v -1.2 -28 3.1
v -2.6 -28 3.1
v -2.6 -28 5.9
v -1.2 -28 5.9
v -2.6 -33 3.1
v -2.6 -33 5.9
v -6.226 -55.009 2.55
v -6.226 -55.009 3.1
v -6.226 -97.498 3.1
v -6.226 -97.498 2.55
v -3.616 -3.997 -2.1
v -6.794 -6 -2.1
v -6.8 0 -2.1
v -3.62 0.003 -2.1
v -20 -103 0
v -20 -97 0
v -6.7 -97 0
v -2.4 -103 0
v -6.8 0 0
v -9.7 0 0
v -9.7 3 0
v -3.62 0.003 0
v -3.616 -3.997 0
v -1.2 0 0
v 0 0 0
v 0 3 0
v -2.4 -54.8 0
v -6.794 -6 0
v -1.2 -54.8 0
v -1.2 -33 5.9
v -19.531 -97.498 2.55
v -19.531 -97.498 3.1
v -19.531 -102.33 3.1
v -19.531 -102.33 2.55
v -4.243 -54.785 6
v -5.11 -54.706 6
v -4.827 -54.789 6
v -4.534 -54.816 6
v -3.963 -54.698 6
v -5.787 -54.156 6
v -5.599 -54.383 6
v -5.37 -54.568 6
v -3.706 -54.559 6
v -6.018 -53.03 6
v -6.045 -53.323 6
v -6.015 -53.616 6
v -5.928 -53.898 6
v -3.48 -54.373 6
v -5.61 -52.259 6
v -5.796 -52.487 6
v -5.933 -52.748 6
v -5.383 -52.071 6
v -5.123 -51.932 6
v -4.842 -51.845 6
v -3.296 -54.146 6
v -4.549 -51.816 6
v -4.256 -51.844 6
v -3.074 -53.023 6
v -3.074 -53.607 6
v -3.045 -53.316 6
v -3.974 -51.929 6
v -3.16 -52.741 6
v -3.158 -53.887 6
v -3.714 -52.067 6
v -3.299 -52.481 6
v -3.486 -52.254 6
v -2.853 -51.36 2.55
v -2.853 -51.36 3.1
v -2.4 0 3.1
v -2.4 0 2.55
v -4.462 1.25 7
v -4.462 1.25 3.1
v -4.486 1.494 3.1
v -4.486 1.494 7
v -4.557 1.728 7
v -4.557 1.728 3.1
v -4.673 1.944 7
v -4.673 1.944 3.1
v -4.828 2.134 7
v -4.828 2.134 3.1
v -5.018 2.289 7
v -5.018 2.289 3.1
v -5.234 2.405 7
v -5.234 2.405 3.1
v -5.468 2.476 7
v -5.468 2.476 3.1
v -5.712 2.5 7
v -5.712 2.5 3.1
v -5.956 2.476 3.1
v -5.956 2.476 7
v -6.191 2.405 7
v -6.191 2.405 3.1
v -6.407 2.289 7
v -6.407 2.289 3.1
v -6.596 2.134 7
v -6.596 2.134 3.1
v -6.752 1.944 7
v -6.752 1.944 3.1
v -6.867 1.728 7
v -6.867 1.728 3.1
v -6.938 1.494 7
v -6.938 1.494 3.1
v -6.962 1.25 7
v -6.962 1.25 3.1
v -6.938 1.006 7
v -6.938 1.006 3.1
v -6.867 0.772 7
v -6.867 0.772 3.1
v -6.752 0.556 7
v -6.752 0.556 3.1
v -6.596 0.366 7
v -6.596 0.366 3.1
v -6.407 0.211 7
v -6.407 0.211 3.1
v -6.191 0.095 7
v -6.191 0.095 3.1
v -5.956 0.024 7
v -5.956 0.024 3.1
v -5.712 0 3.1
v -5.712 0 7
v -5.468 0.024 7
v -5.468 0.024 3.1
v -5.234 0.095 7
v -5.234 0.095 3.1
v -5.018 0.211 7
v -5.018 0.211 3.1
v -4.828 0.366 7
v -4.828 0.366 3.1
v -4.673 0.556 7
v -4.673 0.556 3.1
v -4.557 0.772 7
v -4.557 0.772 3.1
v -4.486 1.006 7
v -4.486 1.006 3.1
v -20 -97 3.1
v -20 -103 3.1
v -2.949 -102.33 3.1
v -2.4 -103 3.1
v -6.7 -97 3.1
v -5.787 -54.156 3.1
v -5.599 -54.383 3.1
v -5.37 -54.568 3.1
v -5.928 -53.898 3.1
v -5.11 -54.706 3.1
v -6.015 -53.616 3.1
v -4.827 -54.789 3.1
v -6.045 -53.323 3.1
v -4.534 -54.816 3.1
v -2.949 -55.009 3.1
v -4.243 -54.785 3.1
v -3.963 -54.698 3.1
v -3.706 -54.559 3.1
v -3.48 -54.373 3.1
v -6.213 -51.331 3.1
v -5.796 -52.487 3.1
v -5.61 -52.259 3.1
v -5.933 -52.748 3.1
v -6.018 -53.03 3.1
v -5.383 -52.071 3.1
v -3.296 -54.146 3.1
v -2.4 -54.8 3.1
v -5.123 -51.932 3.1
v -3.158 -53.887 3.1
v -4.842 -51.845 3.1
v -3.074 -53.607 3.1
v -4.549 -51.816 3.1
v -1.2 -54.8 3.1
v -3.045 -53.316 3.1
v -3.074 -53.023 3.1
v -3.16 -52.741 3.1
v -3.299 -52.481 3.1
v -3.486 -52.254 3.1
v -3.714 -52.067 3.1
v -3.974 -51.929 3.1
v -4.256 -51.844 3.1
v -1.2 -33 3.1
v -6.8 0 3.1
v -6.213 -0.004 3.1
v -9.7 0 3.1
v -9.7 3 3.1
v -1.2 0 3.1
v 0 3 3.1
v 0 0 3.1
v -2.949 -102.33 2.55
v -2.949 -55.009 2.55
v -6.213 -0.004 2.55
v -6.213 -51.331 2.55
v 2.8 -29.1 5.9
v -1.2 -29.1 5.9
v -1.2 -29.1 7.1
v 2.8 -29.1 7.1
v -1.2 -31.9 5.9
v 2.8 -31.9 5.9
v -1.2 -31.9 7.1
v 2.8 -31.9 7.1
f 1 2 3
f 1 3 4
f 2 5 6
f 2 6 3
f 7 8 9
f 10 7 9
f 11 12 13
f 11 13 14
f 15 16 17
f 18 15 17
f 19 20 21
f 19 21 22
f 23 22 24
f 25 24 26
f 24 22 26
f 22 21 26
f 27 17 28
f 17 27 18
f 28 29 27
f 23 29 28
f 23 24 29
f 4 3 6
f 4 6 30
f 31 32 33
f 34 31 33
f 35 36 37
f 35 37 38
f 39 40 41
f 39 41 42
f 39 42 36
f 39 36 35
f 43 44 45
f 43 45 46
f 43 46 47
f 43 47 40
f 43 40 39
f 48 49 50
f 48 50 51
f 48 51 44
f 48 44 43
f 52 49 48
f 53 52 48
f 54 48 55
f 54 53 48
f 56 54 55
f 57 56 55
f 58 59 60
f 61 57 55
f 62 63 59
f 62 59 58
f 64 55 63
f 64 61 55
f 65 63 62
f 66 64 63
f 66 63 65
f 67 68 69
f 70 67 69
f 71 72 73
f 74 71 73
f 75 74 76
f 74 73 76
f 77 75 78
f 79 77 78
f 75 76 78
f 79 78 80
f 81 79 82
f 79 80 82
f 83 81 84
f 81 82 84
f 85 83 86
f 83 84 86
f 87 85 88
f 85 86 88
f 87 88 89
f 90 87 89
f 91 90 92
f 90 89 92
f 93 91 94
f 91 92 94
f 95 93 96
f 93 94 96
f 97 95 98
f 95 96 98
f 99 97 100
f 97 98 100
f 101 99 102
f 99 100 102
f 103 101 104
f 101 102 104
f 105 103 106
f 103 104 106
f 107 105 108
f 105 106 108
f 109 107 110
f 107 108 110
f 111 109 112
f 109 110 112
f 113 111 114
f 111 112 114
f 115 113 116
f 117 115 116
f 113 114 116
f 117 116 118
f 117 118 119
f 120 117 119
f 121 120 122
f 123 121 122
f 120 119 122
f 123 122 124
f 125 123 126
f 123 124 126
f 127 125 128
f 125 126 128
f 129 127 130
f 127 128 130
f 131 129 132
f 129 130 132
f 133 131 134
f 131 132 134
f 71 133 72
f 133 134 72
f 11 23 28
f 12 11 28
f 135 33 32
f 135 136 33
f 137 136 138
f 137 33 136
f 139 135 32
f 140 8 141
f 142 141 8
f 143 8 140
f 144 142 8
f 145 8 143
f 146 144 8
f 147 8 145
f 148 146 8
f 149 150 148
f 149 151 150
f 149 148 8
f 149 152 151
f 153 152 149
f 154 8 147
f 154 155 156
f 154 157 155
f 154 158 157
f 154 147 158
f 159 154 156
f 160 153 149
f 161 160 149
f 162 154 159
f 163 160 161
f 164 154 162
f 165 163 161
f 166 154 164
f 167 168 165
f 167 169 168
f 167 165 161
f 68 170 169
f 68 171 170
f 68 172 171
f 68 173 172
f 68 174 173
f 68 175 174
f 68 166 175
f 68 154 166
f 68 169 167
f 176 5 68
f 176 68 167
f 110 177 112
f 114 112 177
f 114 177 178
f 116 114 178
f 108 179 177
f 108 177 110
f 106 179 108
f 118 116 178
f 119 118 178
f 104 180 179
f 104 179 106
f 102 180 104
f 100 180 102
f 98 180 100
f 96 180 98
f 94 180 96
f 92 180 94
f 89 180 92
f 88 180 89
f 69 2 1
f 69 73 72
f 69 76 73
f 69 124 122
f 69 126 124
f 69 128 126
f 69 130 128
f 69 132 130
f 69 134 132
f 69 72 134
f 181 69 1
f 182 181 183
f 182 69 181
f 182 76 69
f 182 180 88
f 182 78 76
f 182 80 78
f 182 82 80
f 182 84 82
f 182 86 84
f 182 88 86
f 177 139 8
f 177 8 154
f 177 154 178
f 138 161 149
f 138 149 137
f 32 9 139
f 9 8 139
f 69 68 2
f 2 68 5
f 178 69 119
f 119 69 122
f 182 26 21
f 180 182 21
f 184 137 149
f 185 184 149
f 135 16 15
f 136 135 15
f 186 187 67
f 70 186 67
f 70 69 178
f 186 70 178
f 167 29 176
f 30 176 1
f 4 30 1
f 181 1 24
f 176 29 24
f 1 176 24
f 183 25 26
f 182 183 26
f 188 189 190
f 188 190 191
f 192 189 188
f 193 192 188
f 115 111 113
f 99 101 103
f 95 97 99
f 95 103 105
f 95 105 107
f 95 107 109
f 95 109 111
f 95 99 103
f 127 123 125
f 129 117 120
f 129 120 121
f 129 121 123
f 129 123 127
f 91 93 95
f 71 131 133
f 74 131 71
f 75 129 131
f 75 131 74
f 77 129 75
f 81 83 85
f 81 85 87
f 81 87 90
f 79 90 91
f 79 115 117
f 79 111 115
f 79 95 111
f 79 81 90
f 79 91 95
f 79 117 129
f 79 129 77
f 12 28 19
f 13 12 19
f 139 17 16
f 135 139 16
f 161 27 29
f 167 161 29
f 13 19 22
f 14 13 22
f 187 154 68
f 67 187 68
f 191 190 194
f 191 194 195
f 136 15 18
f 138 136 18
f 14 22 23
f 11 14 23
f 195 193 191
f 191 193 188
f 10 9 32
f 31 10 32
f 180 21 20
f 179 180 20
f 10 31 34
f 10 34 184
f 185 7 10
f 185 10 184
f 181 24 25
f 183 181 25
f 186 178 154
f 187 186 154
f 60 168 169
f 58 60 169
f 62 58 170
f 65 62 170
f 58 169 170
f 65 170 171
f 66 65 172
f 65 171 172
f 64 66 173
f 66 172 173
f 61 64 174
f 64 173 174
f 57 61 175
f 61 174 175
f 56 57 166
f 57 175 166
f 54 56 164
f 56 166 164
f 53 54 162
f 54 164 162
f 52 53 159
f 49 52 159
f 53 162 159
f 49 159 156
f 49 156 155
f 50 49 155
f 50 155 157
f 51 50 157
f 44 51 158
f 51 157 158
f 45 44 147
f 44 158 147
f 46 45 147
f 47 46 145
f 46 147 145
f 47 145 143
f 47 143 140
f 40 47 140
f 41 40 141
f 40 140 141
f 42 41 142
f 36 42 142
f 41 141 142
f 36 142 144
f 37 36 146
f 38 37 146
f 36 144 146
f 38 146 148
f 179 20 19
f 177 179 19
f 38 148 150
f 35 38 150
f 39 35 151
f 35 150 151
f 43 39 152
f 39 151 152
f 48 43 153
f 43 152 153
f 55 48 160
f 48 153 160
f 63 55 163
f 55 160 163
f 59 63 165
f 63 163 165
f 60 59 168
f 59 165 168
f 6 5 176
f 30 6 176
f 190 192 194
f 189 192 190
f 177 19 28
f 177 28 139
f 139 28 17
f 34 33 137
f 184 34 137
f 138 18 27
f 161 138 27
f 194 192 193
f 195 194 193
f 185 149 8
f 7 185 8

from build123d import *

# Parameters (mm, degrees)
F1_DEPTH  = 3.1
F3_DEPTH  = 2.1
F4_R      = 1.25
F5_DEPTH  = 3.9
F6_W      = 1.4
F6_H      = 5
F7_DEPTH  = 2.8
F8_W      = 4
F8_H      = 2.8
F9_DEPTH  = 1.2
F11_DEPTH = 2.9
F14_DEPTH = 0.55
F15_DEPTH = 0.55


with BuildPart() as f1:
    # F0 (on Top) → F1 (new body)
    with BuildSketch(Plane.XY):
        Polygon((0, 0), (0, 3), (-9.7, 3), (-9.7, 0), (-6.8, 0), (-6.7, -97), (-20, -97), (-20, -103), (-2.4, -103), (-2.4, -54.8), (-1.2, -54.8), (-1.2, 0), align=None)
    extrude(amount=F1_DEPTH)

    # F2 (on face) → F3 (join)
    with BuildSketch(Plane(origin=(0, 0, 0), x_dir=(1, 0, 0), z_dir=(0, 0, -1))):
        Polygon((-6.7938144363, 5.9999968116), (-6.8, 0), (-3.6200799611, -0.0032782681), (-3.615956252, 3.9967196063), align=None)
    extrude(amount=F3_DEPTH)

    # F4 (on face) → F5 (join)
    with BuildSketch(Plane.XY.offset(3.1)):
        with Locations((-5.7123401202, 1.25)):
            Circle(F4_R)
    extrude(amount=F5_DEPTH)

    # F6 (on face) → F7 (join)
    with BuildSketch(Plane.XY.offset(3.1)):
        with Locations((-1.9, -30.5)):
            Rectangle(F6_W, F6_H)
    extrude(amount=F7_DEPTH)

    # F10 (on face) → F11 (join)
    with BuildSketch(Plane.XY.offset(3.1)):
        with BuildLine():
            ThreePointArc((-4.5339315057, -54.8157951462), (-3.4804557737, -54.3725637742), (-3.0450340513, -53.3158362356))
            ThreePointArc((-3.0450340513, -53.3158362356), (-5.6096123289, -52.259108697), (-4.5339315057, -54.8157951462))
        make_face()
    extrude(amount=F11_DEPTH)

    # F13 (on face) → F14 (cut)
    with BuildSketch(Plane.XY.offset(3.1)):
        Polygon((-2.9493372479, -102.3303940892), (-2.9493372479, -55.0090484321), (-6.2264152803, -55.0090484321), (-6.2264152803, -97.4978655577), (-19.5306297392, -97.4978655577), (-19.5306297392, -102.3303940892), align=None)
    extrude(amount=-F14_DEPTH, mode=Mode.SUBTRACT)

    # F12 (on face) → F15 (cut)
    with BuildSketch(Plane.XY.offset(3.1)):
        Polygon((-2.8533523054, -51.3604094433), (-2.4, 0), (-6.213176353, -0.0039311096), (-6.213176353, -51.3307526708), align=None)
    extrude(amount=-F15_DEPTH, mode=Mode.SUBTRACT)


with BuildPart() as f9:
    # F8 (on face) → F9 (new body)
    with BuildSketch(Plane.XY.offset(5.9)):
        with Locations((0.8, -30.5)):
            Rectangle(F8_W, F8_H)
    extrude(amount=F9_DEPTH)


solid = Compound([f1.part, f9.part])
